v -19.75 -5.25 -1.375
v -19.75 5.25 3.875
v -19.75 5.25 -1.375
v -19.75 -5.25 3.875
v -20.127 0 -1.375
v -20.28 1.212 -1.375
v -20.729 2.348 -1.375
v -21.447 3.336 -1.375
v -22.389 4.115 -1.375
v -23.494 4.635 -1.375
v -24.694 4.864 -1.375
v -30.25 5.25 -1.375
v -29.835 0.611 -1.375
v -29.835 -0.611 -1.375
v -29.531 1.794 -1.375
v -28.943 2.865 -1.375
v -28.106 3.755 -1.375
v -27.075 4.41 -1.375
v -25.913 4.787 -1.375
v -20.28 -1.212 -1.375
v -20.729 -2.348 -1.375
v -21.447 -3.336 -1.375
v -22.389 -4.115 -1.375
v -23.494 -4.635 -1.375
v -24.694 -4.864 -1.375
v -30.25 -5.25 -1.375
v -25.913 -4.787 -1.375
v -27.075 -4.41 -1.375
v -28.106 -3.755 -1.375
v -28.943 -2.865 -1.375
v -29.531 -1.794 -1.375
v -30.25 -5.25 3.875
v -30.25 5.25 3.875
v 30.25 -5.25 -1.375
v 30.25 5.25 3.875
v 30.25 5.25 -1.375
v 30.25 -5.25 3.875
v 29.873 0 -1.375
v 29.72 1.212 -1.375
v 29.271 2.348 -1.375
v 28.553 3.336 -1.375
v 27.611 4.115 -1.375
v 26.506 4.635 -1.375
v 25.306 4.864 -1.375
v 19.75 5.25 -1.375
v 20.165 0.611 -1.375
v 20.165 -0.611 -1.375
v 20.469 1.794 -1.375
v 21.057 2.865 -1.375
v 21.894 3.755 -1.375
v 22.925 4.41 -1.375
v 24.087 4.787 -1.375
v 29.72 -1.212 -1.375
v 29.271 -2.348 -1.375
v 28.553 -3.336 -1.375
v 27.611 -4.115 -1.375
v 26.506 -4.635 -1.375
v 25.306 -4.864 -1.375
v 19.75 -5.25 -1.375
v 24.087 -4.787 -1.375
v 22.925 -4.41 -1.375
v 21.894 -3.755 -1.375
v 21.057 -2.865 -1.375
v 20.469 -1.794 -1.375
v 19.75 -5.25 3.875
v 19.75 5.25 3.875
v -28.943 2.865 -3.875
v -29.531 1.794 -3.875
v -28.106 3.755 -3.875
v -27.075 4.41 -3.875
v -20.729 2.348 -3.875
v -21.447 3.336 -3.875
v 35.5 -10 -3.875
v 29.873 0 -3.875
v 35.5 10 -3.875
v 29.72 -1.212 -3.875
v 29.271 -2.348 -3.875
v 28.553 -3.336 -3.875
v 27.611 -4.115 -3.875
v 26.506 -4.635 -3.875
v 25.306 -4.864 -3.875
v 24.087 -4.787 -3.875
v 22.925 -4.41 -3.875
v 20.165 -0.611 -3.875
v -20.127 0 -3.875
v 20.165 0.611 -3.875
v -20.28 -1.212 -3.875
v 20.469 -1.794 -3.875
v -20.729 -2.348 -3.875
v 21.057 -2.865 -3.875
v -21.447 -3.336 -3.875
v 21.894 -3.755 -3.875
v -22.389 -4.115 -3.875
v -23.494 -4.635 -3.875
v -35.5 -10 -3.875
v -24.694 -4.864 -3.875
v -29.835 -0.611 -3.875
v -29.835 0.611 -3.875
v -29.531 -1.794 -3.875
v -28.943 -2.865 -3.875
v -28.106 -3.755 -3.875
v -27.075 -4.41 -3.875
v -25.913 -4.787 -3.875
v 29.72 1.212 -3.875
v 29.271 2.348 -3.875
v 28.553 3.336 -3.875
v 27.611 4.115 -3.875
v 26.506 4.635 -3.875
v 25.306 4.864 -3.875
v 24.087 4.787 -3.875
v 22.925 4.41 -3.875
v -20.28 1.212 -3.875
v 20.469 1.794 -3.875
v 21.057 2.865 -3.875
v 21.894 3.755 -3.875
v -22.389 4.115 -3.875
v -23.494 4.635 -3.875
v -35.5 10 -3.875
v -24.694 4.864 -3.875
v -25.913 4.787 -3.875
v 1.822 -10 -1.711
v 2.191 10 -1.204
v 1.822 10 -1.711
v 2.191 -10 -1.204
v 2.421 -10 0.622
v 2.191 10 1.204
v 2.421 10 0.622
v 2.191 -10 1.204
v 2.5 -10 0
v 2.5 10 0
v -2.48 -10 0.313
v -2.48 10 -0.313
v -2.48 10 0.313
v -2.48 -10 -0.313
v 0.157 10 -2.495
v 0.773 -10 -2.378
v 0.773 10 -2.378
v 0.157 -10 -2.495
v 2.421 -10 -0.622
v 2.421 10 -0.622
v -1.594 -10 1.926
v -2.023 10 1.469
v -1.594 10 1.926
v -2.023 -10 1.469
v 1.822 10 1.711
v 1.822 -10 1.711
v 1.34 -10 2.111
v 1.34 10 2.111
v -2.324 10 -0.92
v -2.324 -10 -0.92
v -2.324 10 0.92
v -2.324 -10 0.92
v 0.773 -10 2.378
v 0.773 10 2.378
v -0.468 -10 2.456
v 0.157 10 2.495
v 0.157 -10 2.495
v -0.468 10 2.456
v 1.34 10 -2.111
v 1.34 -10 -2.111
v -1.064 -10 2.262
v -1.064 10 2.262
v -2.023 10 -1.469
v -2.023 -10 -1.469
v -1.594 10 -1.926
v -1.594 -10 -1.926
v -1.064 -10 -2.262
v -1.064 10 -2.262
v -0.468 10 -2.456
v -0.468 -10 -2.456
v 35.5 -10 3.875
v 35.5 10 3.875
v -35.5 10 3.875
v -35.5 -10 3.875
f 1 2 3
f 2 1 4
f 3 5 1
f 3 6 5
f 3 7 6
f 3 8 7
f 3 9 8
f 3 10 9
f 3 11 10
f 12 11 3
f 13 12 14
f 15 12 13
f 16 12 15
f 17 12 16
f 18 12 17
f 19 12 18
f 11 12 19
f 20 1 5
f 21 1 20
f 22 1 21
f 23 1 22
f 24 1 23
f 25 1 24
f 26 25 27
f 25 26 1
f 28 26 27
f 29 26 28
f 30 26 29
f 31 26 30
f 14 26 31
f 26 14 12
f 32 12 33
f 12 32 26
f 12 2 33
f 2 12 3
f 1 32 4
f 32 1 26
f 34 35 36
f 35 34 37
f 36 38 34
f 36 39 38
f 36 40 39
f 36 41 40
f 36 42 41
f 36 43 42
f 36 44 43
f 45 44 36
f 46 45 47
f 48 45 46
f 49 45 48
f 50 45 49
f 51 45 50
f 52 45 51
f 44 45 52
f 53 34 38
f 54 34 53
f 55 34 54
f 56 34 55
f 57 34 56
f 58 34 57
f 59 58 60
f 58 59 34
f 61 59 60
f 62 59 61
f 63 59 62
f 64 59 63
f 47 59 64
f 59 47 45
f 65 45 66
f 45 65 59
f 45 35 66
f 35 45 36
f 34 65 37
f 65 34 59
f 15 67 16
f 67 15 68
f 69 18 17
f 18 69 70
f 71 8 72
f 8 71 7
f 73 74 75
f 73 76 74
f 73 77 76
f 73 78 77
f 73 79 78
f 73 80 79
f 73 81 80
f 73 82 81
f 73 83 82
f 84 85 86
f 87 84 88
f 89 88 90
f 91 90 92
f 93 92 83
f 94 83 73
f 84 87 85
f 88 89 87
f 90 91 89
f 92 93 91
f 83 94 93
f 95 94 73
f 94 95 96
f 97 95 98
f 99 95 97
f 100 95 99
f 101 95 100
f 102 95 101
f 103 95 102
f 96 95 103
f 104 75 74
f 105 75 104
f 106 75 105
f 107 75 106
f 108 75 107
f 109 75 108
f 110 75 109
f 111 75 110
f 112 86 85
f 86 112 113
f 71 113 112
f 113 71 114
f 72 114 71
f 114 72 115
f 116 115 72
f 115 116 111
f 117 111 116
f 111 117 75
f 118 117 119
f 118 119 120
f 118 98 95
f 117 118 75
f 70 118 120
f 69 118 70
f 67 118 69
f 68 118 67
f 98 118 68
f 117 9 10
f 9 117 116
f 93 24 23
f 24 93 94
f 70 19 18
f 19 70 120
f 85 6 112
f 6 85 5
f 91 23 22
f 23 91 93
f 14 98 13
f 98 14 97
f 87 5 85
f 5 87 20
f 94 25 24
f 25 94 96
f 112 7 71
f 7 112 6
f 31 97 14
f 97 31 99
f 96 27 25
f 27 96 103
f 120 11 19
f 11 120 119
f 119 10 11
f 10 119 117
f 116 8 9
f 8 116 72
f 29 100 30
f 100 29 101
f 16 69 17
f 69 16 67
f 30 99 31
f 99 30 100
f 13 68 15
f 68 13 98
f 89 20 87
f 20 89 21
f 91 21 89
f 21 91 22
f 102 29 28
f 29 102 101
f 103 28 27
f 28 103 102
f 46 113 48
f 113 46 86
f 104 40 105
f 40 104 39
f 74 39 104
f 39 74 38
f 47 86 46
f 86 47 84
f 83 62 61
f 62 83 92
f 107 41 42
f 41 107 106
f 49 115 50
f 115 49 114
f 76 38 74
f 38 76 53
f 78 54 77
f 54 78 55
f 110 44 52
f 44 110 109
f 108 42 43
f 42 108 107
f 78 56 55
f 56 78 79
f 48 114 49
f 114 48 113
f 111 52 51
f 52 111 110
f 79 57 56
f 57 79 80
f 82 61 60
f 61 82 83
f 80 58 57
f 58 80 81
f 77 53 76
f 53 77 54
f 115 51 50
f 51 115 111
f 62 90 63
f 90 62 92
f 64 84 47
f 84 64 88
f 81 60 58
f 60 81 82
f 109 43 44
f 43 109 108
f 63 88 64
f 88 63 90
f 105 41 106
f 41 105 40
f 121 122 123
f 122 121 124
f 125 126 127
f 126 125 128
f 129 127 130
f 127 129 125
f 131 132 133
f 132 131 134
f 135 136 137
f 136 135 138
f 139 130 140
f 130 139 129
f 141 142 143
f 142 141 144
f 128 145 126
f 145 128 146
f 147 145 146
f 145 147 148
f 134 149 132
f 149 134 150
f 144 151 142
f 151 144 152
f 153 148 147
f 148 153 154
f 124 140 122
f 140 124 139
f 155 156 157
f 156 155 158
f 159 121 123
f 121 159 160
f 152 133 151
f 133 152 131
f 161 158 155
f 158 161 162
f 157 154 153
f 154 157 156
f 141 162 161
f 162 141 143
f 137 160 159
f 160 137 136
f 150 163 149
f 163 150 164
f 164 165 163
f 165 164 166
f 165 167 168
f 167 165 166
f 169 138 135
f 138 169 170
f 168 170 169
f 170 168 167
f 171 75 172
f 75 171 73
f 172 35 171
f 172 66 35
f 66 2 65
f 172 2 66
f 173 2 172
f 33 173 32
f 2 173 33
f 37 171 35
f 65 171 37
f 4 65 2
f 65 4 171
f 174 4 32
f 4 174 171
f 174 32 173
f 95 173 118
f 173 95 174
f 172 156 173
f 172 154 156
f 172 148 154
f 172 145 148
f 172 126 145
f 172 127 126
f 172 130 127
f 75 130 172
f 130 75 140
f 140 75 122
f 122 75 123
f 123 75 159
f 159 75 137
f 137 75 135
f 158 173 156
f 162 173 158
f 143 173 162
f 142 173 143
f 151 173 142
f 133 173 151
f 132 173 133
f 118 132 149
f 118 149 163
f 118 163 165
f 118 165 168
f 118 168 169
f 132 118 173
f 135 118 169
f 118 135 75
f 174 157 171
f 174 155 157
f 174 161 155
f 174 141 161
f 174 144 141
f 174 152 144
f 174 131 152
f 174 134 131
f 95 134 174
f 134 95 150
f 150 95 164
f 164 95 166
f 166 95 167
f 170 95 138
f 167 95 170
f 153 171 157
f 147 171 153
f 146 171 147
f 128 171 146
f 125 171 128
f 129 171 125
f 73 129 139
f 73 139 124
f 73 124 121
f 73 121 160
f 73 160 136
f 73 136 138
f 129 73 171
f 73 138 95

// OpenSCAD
// file: variables.scad
// Pinya3 3D Food Printer
// file: variables.scad 
// author: Luis Rodriguez
// version: 0.1
// w3b: 3digitalcooks.com 

// Variables for all the project
// just numbers??
alpha = 0.7;

// FRAME 
frame_alpha = alpha;
frame_profile_width = 20;

frame_height = 410;
frame_width = 200;  // 250mm -> 7capsules~de 8cm
frame_lenght = 200;

// PRINTING AREA
// from: https://www.marginallyclever.com/other/samples/fk-ik-test.html
// Base radius (f) = 80mm
// End Effector radius (e) = 30mm
// Bice length (rf) = 200mm
// Forearm length = 260mm
// PA = 260 x 260 x 260
// X=-128.225 to 128.225 mm 
// Y=-128.225 to 128.225 mm
// Z=-387.23 to -130.781 mm
printing_area_alpha = 0.1;
printing_area_x = 128*2;//195*2;
printing_area_y = 128*2;//195*2;
printing_area_distance_from_motors_base = 130;//151
printing_area_z_max = 387;
printing_area_z = printing_area_z_max - printing_area_distance_from_motors_base;//540-151;
echo("printing z =",printing_area_z);
printing_area_x_displacement = frame_width/2 + printing_area_x/2 + 17;
echo("printing area x displecement", printing_area_x_displacement);

// FOREARM 
forearm_alpha = alpha;
forearm_length = 260;
forearm_rad = 4;
forearm_motors_joint_rad = 25;
forearm_ball_diameter = 12;
forearm_bicep_joint_degree = 150;

// BICEP
bicep_length = 200;
bicep_rad = forearm_rad;
bicep_motors_joint_rad = forearm_motors_joint_rad;
bicep_motors_joint_degree = 100;

// MOTORS BASE
motors_base_alpha = alpha;
motors_base_thickness = 6;
motors_base_rad = forearm_motors_joint_rad;

stepper_bracket_base_thickness = 5;
stepper_motor_width = 42.3;

// DELTA BEAM
delta_beam_alpha = alpha;
delta_beam_length = printing_area_x_displacement 
                    + forearm_motors_joint_rad 
                    + frame_width/2;
echo("Delta beam lenght = ", delta_beam_length);
delta_beam_profile_width = frame_profile_width*3; //60cm
delta_beam_under_frame = 0; // 1 = Beam under frame or 0 = Beam on frame
delta_beam_bolt_rad = 4;
delta_beam_distance_btw_slots = 20;


// CAROUSEL
carousel_alpha = 0.3;
carousel_number_of_tools = 11;
carousel_offset_rotation = 0; // in degrees
carousel_rad = frame_width-20;//160;
carousel_tool_height = 180;
carousel_tool_rad = 40;

// GEARED STEPPER
stepper_shaft_diameter = 8;

// MOTOR BICEP JOINT
motor_bicep_joint_shaft_holder_diameter = 21;
motor_bicep_joint_shaft_holder_thickness = 12;

motor_bicep_joint_bicep_holder_width = motor_bicep_joint_shaft_holder_thickness;
motor_bicep_joint_bicep_holder_length = 20 + motor_bicep_joint_shaft_holder_diameter/2;

motor_bicep_joint_bicep_insert_lenght = 20;

motor_bicep_joint_shaft_bolt_lenght = 12;
motor_bicep_joint_shaft_bolt_diameter = 3.25;

motor_bicep_joint_bicep_bolt_diameter = motor_bicep_joint_shaft_bolt_diameter;
motor_bicep_joint_bicep_bolt_lenght = 30;

motor_bicep_joint_shaft_nut_thickness = 3;
motor_bicep_joint_shaft_nut_width = 6.2;
motor_bicep_joint_shaft_nut_hole_height = 30;
motor_bicep_joint_shaft_nut_displacement = stepper_shaft_diameter/3 + 
            (motor_bicep_joint_shaft_holder_diameter/2 - stepper_shaft_diameter/2)/2;
motor_bicep_joint_bicep_nut_diameter = 6.5;
motor_bicep_joint_bicep_nut_thickness = motor_bicep_joint_shaft_nut_thickness;

motor_bicep_joint_shaft_flat_displecement = -4.6;
// BICEP
bicep_diameter = 8;

// MAGNET
magnet_clearance = 0.5;
magnet_cube_side = magnet_clearance + 10;

// BICEP FOREARM JOINT
bfj_distance_btw_forearms = 50;
bfj_width = bfj_distance_btw_forearms + 2*magnet_cube_side;
bfj_thickness = 20;
bfj_forearms_joint_ball_sliding_height = 2.5;
bfj_height = magnet_cube_side/2 + bfj_forearms_joint_ball_sliding_height;
bfj_screw_diameter = 5;

// bfj_ball_sliding_rad calculation
R = forearm_ball_diameter/2;
r = bfj_forearms_joint_ball_sliding_height;
r_prima = R - r;
echo("r_prima", r_prima);
cosx = r_prima/R;
x = acos(cosx);
echo("x", x);
bfj_ball_sliding_rad = R*sin(x);
echo(bfj_ball_sliding_rad);

// END EFFECTOR
ef_rad =  66;
ef_distance_btw_forearms = bfj_distance_btw_forearms;
ef_side_width = bfj_distance_btw_forearms + 20;
ef_magnet_hole_edge_offset = magnet_cube_side/2 + 2;

ef_blocking_hole_diameter = 3.33;
ef_blocking_hole_pos_diameter = 25;

ef_cutted_corners_pos_diameter = 35;

ef_tool_ole_rad = 21;

print_offset = 0.33;

magnet_rad = 8/2 + print_offset;
magnet_position_rad = 20;
magnet_height = 6 + print_offset;

ef_ball_sliding_magnet_clearance = bfj_forearms_joint_ball_sliding_height;
ef_ball_sliding_rad = bfj_ball_sliding_rad;

ef_thickness = 5.5 + ef_ball_sliding_magnet_clearance;
echo(ef_thickness);
// main file
// Pinya3 3D Food Printer
// file: bicep_forearm_joint.scad 
// author: Luis Rodriguez
// version: 0.1
// w3b: 3digitalcooks.com

include <variables.scad>

module bicep_forearm_joints() {
  bicep_forearm_joint();
}

bicep_forearm_joint();

module bicep_forearm_joint(){
  difference(){
    union(){ // Add
        bfj_body();
    }
    union(){ // Substract
        bfj_magnets_holes();
        bfj_bicep_screw_hole();
        bfj_forearms_joint_ball_sliding_holes();
    }
  }
}

// ADD
module bfj_body() {
  cube([bfj_width, 
        bfj_thickness, 
        bfj_height], center=true);
}

// SUBSTRACT
module bfj_magnets_holes() {
  for (i = [-1,1]) {
    translate([i*bfj_distance_btw_forearms/2, 
               0, 
               bfj_height/2])
      cube([magnet_cube_side, 
            magnet_cube_side, 
            magnet_cube_side], center=true);
  }
}

module bfj_bicep_screw_hole() {
  rotate([90, 0, 0])
  cylinder(h = bfj_height*3, r = bfj_screw_diameter/2, center=true, $fn = 25);
}

module bfj_forearms_joint_ball_sliding_holes() {
  #for (i = [-1,1]) {
    translate([i*bfj_distance_btw_forearms/2, 
               0, 
               -bfj_height/2 + bfj_forearms_joint_ball_sliding_height/2])
      cylinder( h = bfj_forearms_joint_ball_sliding_height, 
                r = bfj_ball_sliding_rad, center=true, $fn = 25);
  }
}
